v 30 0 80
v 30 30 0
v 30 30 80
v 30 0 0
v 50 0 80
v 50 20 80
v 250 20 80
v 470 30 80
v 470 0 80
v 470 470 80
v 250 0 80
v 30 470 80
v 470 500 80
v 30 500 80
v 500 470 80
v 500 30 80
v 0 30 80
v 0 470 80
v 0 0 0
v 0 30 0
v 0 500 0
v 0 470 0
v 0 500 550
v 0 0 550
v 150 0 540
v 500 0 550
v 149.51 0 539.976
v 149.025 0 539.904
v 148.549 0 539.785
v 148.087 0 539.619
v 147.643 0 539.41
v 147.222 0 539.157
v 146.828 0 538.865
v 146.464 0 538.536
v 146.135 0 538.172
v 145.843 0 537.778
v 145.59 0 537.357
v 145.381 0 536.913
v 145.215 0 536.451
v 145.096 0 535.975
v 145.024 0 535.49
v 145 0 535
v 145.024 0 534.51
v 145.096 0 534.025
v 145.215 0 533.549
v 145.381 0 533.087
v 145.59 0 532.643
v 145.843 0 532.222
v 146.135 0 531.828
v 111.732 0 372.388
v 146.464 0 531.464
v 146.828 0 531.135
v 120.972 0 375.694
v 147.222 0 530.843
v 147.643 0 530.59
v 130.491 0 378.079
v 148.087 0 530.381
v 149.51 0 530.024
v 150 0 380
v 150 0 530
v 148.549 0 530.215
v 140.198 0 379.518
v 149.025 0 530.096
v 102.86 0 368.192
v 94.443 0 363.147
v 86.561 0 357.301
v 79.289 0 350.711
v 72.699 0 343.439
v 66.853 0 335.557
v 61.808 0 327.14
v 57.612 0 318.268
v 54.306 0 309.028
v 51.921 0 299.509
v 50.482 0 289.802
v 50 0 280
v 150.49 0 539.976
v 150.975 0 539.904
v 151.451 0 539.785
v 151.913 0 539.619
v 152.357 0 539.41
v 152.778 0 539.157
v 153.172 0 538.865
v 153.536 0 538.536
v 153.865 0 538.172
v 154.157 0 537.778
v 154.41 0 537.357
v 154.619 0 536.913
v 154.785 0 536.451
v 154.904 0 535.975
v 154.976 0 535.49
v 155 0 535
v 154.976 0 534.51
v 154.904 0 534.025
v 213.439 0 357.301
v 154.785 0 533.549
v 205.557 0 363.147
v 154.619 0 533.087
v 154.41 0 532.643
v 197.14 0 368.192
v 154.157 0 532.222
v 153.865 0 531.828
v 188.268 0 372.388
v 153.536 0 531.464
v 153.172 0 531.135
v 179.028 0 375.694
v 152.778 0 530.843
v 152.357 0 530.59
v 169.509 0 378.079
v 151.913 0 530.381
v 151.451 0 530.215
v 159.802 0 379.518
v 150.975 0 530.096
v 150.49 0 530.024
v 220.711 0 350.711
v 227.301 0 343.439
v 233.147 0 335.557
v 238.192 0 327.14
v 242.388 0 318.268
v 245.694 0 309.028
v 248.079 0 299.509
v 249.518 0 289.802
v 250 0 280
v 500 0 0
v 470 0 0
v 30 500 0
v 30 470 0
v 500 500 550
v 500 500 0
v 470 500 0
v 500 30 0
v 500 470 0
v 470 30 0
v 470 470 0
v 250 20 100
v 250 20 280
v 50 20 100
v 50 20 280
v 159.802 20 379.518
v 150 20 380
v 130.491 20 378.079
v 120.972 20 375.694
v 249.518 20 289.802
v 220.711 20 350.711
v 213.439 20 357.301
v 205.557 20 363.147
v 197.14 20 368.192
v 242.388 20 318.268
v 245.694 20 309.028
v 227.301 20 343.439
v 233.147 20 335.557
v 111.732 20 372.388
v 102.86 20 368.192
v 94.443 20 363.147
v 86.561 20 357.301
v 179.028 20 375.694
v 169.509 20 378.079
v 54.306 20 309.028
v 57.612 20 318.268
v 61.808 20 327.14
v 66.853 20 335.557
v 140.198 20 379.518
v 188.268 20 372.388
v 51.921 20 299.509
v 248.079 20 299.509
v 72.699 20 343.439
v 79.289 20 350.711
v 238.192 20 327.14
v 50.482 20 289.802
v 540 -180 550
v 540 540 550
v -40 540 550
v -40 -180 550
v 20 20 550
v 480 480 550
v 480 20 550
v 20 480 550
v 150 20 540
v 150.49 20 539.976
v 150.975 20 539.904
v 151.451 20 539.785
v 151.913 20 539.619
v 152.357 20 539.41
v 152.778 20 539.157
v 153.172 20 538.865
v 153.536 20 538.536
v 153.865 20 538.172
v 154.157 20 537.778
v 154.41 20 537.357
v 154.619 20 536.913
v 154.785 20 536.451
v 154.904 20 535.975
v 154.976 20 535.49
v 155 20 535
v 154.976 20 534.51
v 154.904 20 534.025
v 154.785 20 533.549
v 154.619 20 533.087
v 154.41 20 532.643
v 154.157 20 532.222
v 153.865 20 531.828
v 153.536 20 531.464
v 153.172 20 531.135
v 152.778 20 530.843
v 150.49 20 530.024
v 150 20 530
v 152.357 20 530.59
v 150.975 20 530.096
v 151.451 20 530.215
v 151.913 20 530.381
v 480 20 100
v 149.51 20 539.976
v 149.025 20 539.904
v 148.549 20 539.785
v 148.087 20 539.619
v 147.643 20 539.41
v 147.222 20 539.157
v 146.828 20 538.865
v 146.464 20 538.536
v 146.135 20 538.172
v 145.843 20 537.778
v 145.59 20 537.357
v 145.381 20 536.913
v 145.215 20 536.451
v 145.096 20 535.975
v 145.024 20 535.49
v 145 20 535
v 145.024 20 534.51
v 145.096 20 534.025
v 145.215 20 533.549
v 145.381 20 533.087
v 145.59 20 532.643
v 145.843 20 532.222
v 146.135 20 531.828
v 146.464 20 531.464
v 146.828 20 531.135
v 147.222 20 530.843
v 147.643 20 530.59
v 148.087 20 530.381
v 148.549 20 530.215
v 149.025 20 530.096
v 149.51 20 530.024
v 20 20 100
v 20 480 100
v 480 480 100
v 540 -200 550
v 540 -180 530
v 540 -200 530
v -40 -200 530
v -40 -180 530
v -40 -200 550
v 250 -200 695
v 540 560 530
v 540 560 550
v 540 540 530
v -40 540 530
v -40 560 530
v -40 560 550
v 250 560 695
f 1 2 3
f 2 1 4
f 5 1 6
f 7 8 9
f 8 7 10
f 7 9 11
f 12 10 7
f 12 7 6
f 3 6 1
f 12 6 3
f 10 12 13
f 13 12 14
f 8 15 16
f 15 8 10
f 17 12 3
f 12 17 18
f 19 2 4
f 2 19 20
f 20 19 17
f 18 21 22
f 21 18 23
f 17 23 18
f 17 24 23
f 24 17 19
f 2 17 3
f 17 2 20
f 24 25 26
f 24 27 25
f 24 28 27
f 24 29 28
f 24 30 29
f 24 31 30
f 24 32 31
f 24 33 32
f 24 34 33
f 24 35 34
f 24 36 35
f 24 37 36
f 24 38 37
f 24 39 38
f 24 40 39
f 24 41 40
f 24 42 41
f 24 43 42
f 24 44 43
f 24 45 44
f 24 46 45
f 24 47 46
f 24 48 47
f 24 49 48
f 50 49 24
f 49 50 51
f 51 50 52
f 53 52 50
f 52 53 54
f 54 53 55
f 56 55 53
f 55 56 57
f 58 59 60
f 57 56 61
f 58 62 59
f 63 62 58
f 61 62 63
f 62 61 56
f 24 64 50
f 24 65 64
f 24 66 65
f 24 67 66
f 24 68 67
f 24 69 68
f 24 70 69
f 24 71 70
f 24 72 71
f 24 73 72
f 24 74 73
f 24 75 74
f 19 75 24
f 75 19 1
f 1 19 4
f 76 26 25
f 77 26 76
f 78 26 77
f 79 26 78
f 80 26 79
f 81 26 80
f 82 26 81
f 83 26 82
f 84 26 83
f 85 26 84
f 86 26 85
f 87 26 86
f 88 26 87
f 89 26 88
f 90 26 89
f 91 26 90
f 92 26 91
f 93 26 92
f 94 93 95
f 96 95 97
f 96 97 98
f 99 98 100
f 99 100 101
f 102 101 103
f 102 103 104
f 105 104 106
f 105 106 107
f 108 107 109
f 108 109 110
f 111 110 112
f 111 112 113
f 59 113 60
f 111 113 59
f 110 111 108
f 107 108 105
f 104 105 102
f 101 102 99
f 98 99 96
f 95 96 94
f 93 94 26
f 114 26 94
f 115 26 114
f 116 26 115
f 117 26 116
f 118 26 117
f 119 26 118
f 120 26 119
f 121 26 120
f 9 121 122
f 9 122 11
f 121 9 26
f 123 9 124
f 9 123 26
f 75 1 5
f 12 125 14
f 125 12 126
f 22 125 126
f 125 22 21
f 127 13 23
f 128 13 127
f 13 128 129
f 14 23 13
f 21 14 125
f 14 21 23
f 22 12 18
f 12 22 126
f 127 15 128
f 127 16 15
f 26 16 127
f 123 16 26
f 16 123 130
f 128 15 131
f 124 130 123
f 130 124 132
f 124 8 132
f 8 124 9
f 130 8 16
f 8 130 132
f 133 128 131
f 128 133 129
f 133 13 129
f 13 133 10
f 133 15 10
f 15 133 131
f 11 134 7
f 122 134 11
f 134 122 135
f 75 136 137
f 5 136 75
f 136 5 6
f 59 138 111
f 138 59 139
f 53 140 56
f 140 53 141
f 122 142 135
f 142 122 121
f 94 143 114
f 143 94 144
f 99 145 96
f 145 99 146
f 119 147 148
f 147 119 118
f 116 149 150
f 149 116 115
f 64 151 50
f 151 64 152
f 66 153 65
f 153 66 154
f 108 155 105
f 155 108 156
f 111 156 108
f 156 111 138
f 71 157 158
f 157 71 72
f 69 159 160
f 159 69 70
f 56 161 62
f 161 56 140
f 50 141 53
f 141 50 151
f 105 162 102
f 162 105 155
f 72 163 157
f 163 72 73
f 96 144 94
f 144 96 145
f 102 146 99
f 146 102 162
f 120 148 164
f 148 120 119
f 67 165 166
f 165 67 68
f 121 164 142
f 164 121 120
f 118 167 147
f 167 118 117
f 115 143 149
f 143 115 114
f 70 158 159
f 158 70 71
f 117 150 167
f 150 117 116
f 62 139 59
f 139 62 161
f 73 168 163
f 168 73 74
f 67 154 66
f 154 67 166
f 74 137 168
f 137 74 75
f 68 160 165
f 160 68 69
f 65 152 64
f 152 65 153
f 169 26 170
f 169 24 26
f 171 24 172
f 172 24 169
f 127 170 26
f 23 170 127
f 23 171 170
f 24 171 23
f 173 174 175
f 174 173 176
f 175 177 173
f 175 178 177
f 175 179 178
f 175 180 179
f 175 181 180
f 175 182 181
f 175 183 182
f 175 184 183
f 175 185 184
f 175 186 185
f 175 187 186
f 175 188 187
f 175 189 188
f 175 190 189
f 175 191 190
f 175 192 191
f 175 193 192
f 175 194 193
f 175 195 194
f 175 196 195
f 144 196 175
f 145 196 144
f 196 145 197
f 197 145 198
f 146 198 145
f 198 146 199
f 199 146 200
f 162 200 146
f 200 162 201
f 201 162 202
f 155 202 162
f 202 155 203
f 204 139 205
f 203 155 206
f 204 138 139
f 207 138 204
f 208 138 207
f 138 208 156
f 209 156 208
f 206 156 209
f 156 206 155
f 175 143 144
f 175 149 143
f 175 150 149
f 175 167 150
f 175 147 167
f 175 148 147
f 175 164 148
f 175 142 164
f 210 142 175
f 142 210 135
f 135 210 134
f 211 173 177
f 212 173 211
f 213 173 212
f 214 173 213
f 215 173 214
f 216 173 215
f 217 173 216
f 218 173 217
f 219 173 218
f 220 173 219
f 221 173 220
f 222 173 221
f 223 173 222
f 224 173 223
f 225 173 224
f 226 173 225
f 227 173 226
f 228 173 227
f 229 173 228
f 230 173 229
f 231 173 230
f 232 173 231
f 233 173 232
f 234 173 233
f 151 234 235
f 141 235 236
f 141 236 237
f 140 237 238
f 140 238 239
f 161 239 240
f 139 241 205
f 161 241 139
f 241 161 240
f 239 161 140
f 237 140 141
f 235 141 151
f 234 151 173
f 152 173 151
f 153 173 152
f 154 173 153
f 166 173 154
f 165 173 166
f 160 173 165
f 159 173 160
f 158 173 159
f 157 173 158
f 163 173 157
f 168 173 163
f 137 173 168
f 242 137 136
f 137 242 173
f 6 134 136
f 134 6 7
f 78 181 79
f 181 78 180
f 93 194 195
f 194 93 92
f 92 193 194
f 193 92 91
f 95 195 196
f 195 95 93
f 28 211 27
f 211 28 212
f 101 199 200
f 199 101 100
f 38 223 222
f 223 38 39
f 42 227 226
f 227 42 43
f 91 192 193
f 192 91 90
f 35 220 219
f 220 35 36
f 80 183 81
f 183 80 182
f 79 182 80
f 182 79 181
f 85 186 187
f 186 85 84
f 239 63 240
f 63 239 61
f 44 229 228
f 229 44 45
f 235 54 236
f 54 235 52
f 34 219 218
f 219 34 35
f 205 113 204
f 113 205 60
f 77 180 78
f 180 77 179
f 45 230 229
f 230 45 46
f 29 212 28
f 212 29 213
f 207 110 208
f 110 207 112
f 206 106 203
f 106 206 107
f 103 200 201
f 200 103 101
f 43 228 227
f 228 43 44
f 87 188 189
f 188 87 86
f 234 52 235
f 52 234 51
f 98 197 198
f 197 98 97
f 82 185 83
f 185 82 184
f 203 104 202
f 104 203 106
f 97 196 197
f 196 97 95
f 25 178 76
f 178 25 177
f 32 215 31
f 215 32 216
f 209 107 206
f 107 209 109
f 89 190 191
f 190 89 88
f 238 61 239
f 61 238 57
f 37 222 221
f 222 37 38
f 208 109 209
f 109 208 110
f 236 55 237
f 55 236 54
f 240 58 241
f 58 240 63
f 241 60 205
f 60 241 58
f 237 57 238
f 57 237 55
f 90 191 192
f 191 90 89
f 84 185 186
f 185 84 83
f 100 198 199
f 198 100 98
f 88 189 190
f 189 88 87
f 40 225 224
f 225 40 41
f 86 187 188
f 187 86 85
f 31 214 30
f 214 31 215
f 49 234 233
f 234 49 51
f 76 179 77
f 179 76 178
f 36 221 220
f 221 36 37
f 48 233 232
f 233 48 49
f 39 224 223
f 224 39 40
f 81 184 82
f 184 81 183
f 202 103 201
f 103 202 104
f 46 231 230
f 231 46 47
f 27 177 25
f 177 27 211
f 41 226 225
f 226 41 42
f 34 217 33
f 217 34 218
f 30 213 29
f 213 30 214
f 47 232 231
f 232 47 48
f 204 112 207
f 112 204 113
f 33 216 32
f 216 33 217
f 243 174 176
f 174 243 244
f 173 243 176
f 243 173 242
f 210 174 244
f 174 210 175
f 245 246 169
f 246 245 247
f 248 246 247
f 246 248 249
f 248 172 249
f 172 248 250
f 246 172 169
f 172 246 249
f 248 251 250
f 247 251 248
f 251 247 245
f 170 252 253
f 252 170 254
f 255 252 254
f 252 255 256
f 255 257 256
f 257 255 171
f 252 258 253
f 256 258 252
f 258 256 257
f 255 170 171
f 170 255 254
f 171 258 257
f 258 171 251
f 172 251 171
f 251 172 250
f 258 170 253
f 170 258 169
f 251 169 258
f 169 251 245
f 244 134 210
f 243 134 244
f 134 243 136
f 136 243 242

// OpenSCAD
// ================================================================
//  Smart Shelter — Dog House 3D Model
//  Units: mm  |  Scale 1:1
// ================================================================

// ── DIMENSIONS ──────────────────────────────────────────────────
W      = 500;        // total width
D      = 500;        // depth (front to back)
H_leg  = 80;         // leg height
leg_s  = 30;         // leg cross-section
t      = 20;         // wall / plank thickness
H_wall = 470;        // wall height (floor → eave)
H_peak = 145;        // gable peak above eave

// Entrance
ent_w  = 200;        // width = 20cm
ent_r  = ent_w / 2; // arch radius = 100
ent_hs = 300 - ent_r; // straight part so total height = 300mm (30cm)
ent_x  = 50;         // 5cm from left wall

// Sensor hole (VL53L1X — Ø10mm, 150mm above arch top)
sens_r = 5;
sens_z = ent_hs + ent_r + 150 + sens_r; // z from floor

// Cable hole — Ø10mm, near bottom of front wall
cable_r = 5;
cable_z = 30; // 30mm above floor

// Roof overhangs
ov_f = 200;  // front
ov_b =  60;  // back
ov_s =  40;  // each side

// Colors
C_WOOD = [0.72, 0.52, 0.30];
C_DARK = [0.40, 0.24, 0.10];
C_FELT = [0.20, 0.18, 0.18];

$fn = 64;

// ── MODULES ─────────────────────────────────────────────────────

module leg() {
    color(C_DARK) cube([leg_s, leg_s, H_leg]);
}

module front_wall() {
    color(C_WOOD)
    difference() {
        cube([W, t, H_wall]);
        // entrance arch cutout — 5cm from left, 25cm from right
        translate([ent_x, -1, 0]) {
            cube([ent_w, t+2, ent_hs]);
            translate([ent_r, 0, ent_hs])
                rotate([-90, 0, 0])
                    cylinder(h=t+2, r=ent_r);
        }
        // sensor hole (centered on entrance)
        translate([ent_x + ent_r, -1, sens_z])
            rotate([-90, 0, 0])
                cylinder(h=t+2, r=sens_r);
        // cable hole (bottom, same x center)
        translate([ent_x + ent_r, -1, cable_z])
            rotate([-90, 0, 0])
                cylinder(h=t+2, r=cable_r);
    }
}

module back_wall() {
    color(C_WOOD) cube([W, t, H_wall]);
}

module side_wall(depth) {
    color(C_WOOD) cube([t, depth, H_wall]);
}

module floor_board() {
    color(C_WOOD) cube([W - 2*t, D - 2*t, t]);
}

module roof() {
    rw = W + 2*ov_s;
    rd = D + ov_f + ov_b;
    color(C_FELT)
    translate([-ov_s, -ov_f, 0])
    polyhedron(
        points = [
            [0,    0,  0],        // 0 front-left
            [rw,   0,  0],        // 1 front-right
            [rw/2, 0,  H_peak],   // 2 front-peak
            [0,    rd, 0],        // 3 back-left
            [rw,   rd, 0],        // 4 back-right
            [rw/2, rd, H_peak]    // 5 back-peak
        ],
        faces = [
            [0,2,1],      // front gable
            [3,4,5],      // back gable
            [0,1,4,3],    // bottom (eave line)
            [1,2,5,4],    // right slope
            [0,3,5,2]     // left slope
        ]
    );
}

module fascia_boards() {
    color(C_DARK) {
        translate([-ov_s, -ov_f, -t])
            cube([W + 2*ov_s, t, t]);  // front eave board
        translate([-ov_s, D + ov_b - t, -t])
            cube([W + 2*ov_s, t, t]);  // back eave board
    }
}

// ── ASSEMBLY ────────────────────────────────────────────────────

// 4 corner legs
for (lx = [0, W - leg_s], ly = [0, D - leg_s])
    translate([lx, ly, 0]) leg();

// Floor
translate([t, t, H_leg]) floor_board();

// Walls (placed on top of legs)
translate([0, 0, H_leg]) {
    front_wall();                              // y = 0
    translate([0, D-t, 0]) back_wall();       // y = D-t
    translate([0,   t, 0]) side_wall(D-2*t); // left
    translate([W-t, t, 0]) side_wall(D-2*t); // right
}

// Roof + fascia at eave level
translate([0, 0, H_leg + H_wall]) {
    roof();
    fascia_boards();
}
